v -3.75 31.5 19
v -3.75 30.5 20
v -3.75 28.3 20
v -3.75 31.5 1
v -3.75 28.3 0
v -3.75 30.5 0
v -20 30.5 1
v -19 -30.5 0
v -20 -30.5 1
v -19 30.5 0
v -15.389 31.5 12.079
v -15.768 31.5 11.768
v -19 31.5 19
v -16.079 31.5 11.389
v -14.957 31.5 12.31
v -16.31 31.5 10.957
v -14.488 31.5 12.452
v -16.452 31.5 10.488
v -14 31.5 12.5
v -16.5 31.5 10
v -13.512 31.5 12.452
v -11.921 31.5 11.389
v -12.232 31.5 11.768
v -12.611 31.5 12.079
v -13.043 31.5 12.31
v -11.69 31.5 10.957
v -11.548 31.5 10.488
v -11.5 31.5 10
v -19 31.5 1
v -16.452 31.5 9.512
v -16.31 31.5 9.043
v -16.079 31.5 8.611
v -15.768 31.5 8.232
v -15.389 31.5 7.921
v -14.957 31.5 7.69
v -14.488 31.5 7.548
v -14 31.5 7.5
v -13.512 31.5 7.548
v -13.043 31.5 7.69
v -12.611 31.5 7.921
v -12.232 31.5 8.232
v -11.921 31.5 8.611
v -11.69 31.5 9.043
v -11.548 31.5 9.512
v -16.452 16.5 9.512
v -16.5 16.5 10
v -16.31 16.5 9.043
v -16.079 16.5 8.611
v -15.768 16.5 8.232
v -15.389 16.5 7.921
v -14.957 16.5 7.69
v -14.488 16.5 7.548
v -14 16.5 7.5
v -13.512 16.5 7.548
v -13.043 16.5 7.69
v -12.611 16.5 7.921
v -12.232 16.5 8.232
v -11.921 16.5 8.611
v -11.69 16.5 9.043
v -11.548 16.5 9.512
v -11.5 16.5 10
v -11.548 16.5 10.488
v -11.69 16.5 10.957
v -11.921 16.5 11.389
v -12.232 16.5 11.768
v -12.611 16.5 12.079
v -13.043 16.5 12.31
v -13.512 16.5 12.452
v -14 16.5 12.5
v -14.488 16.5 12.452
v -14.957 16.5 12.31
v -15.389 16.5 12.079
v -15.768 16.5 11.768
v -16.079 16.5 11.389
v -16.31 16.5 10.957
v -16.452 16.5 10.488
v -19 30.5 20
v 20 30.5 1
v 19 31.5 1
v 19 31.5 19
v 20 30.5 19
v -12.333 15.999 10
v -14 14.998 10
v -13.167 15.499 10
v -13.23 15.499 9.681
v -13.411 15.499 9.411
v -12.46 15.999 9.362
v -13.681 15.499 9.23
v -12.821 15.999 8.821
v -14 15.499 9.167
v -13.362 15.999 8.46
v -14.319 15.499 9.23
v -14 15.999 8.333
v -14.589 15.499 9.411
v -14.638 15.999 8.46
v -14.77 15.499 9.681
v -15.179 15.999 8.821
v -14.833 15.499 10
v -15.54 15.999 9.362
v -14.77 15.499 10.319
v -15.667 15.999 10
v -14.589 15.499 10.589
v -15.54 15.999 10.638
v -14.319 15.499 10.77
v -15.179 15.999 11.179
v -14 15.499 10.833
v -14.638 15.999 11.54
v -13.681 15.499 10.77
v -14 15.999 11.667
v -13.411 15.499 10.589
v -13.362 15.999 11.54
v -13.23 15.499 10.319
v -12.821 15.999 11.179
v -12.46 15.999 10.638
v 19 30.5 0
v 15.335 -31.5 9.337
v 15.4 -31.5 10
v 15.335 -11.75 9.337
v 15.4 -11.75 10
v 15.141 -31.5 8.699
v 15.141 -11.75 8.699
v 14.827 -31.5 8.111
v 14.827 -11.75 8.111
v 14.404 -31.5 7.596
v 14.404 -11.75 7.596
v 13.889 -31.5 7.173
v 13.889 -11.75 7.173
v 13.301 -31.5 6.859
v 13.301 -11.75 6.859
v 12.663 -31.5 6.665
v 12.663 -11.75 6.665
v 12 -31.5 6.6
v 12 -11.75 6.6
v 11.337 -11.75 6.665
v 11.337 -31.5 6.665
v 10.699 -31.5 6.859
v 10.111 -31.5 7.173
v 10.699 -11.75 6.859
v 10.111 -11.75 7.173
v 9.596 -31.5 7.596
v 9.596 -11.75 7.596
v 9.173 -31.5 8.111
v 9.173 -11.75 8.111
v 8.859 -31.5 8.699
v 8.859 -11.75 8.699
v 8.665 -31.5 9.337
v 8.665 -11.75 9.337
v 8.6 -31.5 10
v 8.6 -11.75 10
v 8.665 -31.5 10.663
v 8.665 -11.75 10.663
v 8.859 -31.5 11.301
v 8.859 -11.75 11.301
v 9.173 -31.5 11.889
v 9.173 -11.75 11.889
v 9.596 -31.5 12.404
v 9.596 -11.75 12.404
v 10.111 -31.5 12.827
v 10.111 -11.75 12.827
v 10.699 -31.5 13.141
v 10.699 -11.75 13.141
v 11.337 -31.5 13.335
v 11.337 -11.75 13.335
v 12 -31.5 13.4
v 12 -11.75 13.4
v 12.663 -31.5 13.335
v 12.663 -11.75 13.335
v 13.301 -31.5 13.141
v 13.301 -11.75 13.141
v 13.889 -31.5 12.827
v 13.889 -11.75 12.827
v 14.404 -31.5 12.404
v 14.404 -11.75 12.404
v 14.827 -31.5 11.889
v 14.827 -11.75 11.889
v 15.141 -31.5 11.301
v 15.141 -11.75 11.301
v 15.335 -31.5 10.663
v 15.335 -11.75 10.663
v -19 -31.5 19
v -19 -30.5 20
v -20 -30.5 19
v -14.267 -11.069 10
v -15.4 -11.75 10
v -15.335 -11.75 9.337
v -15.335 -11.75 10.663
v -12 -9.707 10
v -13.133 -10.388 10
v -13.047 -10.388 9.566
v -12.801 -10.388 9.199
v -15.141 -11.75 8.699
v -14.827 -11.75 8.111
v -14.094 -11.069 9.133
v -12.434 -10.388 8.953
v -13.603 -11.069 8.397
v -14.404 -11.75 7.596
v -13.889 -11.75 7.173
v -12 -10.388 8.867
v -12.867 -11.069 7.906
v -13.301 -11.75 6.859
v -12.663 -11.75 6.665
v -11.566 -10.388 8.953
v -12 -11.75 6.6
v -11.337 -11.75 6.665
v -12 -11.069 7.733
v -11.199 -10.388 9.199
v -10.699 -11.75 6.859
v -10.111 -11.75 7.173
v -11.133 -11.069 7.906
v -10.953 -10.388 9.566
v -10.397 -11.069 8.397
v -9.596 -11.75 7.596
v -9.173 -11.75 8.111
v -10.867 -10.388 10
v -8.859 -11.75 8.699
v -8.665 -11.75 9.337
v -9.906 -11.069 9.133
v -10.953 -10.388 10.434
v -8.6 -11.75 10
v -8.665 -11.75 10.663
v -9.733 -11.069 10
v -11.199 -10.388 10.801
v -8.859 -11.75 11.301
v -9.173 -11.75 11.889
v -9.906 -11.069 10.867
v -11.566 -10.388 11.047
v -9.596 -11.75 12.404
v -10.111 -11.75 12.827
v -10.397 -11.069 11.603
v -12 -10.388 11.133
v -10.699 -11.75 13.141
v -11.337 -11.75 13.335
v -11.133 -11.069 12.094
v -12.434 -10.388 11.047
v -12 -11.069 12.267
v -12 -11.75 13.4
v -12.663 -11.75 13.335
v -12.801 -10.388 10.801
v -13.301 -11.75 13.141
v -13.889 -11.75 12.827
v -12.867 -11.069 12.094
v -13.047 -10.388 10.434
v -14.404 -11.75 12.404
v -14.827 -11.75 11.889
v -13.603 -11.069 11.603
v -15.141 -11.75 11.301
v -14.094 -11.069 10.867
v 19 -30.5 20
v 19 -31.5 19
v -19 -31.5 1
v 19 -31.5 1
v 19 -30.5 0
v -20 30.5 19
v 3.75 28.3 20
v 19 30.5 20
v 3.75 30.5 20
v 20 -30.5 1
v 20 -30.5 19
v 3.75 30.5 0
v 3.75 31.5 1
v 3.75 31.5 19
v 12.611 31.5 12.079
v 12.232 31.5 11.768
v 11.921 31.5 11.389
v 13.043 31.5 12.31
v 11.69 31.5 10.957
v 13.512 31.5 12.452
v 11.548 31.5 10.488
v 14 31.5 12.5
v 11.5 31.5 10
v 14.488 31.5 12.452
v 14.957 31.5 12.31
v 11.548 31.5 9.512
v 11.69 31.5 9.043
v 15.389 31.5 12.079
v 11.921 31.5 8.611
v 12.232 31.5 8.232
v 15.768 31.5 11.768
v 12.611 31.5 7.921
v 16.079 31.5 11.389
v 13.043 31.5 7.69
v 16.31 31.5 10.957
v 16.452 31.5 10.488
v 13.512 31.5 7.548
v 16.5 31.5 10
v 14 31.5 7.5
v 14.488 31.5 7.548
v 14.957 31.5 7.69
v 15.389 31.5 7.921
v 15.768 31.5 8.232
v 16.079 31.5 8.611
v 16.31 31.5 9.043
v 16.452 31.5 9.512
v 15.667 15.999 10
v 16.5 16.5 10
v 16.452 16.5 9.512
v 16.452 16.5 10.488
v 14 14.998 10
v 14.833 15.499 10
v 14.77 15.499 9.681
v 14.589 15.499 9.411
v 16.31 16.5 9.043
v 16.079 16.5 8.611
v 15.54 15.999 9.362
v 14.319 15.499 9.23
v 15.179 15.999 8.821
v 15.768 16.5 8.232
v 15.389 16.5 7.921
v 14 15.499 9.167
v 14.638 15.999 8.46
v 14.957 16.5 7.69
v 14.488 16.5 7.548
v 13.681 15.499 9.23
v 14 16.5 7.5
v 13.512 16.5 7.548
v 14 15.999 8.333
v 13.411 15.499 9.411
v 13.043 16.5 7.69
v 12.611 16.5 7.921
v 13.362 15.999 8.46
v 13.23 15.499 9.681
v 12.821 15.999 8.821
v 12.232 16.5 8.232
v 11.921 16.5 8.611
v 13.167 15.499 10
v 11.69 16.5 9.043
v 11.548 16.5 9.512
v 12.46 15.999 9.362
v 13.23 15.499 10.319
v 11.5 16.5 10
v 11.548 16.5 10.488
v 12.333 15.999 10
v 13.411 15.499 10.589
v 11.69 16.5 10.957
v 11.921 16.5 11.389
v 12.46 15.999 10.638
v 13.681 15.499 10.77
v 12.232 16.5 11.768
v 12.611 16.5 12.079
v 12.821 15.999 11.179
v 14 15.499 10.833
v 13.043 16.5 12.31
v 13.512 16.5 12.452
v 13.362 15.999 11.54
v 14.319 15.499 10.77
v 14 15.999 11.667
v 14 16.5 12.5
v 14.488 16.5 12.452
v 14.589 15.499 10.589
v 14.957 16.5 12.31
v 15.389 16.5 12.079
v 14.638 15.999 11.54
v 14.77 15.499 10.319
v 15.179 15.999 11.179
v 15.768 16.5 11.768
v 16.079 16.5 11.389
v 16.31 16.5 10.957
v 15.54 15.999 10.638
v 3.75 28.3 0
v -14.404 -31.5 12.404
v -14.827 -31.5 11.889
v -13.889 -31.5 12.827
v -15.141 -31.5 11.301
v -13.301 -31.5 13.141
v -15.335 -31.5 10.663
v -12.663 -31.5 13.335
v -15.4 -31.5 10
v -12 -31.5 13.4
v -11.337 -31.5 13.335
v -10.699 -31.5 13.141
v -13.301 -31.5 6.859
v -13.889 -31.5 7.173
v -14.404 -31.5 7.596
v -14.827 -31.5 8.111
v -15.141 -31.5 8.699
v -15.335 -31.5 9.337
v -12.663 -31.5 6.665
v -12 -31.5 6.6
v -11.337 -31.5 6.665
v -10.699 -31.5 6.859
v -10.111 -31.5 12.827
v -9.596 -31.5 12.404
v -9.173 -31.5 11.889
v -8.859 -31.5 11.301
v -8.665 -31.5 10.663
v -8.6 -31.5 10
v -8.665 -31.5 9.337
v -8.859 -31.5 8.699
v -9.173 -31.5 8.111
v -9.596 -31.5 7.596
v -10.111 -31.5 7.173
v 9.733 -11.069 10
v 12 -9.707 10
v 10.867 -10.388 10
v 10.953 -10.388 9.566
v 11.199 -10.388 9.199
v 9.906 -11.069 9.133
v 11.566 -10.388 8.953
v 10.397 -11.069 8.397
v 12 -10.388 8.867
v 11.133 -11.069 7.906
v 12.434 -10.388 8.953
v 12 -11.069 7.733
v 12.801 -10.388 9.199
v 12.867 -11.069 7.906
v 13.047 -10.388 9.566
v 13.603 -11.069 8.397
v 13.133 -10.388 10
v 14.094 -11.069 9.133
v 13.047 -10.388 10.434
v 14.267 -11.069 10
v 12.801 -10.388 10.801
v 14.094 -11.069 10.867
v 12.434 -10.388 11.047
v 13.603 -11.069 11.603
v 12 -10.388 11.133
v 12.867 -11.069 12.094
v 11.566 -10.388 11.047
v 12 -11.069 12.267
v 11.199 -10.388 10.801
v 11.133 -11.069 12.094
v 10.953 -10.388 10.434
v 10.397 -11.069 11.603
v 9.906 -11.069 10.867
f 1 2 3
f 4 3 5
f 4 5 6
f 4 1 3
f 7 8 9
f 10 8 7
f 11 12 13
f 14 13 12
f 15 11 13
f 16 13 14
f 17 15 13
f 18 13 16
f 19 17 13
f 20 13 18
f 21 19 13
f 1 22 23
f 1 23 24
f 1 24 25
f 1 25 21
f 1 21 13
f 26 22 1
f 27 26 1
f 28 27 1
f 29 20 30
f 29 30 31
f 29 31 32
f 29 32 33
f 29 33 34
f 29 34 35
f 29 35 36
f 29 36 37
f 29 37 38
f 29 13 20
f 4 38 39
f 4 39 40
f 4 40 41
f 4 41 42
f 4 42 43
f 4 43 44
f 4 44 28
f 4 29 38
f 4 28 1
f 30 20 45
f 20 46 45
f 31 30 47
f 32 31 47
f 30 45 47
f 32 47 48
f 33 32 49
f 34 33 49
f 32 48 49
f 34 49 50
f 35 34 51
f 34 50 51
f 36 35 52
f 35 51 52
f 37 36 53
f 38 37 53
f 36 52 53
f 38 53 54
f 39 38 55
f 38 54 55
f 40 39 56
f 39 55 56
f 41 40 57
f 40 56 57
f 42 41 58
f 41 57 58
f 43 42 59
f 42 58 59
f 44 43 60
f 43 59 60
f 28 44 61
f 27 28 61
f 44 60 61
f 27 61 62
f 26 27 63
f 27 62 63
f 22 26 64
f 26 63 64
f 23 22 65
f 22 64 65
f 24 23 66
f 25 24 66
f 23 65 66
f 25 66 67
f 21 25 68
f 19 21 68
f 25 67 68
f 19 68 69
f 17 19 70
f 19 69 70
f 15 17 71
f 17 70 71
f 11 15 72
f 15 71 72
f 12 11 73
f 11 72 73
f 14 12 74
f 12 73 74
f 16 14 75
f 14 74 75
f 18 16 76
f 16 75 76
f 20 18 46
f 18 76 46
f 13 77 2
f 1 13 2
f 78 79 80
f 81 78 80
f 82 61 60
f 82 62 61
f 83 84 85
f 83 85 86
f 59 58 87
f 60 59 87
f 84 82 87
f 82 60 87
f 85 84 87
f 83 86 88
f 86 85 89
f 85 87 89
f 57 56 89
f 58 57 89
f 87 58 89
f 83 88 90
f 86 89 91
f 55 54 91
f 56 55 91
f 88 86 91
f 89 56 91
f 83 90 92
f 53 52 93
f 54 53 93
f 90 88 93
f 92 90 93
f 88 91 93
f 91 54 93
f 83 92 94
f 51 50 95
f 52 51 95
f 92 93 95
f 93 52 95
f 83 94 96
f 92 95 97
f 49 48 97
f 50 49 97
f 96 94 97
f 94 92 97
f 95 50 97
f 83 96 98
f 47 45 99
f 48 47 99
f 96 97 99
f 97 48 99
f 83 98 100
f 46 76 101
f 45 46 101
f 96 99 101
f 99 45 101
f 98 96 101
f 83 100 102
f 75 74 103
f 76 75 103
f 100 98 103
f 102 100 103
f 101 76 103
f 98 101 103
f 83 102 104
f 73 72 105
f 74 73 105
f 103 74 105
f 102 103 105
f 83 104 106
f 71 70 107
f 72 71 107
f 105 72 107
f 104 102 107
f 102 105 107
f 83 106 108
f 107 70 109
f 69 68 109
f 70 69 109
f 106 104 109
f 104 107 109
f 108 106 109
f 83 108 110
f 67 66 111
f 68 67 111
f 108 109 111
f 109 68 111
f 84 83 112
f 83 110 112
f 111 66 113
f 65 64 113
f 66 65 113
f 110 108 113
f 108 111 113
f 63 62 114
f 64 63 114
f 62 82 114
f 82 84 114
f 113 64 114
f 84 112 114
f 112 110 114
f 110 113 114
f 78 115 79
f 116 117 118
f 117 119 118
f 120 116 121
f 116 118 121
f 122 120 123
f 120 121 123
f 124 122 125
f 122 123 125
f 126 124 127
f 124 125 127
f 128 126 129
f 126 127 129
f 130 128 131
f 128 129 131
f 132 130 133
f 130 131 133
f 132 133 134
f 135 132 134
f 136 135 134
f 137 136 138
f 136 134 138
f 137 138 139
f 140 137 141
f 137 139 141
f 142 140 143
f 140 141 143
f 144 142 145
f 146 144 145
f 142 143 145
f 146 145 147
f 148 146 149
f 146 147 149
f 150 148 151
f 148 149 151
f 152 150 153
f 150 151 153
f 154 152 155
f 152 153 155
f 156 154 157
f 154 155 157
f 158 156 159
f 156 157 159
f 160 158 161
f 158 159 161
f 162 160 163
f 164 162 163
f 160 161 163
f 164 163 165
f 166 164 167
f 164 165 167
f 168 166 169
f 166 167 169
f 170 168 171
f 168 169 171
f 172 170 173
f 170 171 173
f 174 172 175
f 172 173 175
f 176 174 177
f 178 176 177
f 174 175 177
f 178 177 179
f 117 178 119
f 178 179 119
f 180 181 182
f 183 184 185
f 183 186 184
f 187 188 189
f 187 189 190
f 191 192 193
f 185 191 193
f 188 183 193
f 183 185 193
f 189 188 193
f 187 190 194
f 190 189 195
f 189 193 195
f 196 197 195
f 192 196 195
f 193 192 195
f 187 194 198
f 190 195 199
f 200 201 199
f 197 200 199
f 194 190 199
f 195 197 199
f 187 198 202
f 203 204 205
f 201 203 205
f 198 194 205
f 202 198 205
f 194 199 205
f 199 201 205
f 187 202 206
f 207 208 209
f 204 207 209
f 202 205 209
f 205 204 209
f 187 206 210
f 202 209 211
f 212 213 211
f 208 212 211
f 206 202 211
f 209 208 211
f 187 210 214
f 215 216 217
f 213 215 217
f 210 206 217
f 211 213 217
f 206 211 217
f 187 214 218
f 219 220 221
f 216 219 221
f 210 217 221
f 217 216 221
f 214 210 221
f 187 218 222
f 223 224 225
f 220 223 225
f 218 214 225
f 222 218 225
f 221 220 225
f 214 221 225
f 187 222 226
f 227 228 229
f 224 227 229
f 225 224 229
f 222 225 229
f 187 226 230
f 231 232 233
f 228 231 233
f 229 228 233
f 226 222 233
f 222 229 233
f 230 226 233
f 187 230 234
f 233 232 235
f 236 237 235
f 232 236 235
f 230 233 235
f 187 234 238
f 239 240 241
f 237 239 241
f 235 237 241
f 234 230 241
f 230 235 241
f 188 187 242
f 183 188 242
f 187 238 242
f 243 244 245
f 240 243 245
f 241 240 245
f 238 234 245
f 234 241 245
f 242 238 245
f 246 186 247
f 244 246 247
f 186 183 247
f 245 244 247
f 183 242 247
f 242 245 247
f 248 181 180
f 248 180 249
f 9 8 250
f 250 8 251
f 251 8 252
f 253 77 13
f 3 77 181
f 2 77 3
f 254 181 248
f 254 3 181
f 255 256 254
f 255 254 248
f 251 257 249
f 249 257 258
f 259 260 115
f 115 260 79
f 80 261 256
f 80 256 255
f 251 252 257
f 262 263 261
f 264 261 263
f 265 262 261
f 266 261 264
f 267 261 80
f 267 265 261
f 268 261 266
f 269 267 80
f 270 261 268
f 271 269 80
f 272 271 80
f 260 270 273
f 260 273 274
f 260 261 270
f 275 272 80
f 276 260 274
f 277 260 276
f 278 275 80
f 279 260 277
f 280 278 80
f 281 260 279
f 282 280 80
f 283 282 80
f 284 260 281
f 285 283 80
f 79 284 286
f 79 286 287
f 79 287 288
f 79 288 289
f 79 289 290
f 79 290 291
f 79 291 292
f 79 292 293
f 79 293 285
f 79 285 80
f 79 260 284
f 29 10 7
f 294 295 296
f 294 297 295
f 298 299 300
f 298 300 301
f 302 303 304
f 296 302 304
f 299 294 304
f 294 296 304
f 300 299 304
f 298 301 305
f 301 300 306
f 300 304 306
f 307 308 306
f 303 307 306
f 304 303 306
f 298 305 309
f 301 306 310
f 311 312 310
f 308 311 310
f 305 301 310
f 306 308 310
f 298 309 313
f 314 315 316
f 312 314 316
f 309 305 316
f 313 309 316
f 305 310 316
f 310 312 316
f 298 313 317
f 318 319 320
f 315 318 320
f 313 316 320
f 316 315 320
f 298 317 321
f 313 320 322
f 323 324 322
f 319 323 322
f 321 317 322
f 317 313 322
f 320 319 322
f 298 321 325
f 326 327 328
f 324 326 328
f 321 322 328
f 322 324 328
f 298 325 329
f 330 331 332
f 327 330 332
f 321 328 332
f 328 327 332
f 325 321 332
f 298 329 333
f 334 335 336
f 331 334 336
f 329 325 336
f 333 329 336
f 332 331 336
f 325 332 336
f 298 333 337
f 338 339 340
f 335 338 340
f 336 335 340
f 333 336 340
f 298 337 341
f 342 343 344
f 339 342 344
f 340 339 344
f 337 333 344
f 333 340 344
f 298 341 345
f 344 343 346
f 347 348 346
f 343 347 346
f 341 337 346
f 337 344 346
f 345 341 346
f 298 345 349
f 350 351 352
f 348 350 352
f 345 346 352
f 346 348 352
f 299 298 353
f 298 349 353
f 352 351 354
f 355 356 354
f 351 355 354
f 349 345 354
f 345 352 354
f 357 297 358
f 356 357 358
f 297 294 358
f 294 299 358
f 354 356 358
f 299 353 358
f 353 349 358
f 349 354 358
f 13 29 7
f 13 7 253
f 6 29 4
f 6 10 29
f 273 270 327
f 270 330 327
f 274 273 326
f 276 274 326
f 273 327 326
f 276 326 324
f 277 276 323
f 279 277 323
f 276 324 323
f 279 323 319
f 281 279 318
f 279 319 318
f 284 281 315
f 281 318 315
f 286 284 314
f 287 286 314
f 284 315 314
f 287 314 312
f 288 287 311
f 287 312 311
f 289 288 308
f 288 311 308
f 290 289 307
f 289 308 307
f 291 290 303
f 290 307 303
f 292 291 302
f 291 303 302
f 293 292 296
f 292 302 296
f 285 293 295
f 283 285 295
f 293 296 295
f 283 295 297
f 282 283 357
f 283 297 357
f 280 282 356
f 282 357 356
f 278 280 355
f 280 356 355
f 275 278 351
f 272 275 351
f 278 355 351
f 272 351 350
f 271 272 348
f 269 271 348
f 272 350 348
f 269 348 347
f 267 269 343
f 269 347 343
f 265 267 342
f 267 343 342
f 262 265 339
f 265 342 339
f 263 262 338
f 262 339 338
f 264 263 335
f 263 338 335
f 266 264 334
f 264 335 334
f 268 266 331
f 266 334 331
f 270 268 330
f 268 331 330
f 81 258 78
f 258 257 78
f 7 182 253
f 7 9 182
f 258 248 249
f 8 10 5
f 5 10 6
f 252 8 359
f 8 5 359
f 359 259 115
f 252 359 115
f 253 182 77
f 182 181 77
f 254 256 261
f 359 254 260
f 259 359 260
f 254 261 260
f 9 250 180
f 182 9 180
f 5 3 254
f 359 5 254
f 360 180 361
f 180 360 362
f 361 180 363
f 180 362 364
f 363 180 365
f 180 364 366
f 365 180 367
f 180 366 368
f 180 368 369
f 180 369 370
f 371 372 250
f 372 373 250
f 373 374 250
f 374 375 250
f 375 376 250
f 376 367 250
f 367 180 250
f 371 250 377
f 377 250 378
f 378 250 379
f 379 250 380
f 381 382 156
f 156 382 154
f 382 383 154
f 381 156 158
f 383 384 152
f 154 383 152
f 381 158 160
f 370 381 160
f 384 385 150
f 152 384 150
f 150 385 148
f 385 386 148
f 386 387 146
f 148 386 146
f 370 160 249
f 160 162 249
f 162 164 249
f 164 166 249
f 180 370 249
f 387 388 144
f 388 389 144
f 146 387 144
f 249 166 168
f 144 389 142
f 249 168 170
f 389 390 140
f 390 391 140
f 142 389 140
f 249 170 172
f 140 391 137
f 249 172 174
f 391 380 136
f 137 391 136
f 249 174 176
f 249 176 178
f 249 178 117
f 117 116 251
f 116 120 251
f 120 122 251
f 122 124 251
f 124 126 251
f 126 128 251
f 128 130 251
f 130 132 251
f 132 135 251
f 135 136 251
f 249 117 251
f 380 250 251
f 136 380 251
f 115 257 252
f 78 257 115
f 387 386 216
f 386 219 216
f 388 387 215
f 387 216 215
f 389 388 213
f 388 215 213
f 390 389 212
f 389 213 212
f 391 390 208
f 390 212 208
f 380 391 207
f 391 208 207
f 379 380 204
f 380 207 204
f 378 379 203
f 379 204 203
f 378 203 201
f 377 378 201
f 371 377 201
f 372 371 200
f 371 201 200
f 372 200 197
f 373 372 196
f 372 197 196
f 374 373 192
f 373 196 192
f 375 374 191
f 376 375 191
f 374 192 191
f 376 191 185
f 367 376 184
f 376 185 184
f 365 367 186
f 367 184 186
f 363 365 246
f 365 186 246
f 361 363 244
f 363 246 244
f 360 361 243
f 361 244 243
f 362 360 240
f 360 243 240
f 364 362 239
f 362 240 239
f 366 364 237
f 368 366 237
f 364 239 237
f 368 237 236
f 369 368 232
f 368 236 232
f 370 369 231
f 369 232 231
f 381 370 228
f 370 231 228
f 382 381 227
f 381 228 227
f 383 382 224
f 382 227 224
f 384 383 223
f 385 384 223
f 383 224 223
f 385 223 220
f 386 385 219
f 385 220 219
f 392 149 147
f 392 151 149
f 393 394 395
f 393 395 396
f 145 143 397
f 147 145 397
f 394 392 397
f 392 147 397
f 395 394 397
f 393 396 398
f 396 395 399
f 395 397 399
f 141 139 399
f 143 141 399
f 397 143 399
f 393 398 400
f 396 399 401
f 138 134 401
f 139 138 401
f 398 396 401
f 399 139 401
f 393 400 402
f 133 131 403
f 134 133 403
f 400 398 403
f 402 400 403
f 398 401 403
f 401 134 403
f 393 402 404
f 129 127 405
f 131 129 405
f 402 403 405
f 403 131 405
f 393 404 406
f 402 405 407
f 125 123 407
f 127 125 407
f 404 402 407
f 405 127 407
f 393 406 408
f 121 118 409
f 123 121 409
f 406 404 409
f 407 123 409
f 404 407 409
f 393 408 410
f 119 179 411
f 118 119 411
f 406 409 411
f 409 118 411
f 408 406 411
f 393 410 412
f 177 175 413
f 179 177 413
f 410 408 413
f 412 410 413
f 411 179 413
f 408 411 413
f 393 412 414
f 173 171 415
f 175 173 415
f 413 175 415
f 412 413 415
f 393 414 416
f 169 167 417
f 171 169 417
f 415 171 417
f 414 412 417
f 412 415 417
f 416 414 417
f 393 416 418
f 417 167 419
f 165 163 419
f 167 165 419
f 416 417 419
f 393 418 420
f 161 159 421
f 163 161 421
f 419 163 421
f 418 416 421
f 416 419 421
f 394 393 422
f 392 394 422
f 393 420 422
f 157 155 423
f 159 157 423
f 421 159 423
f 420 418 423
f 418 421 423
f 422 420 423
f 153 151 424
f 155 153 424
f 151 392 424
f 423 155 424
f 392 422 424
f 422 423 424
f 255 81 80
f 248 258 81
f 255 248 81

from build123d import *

# Parameters (mm, degrees)
SKETCH1_W             = 40
SKETCH1_H             = 63
BOSS_EXTRUDE1_DEPTH   = 20
SKETCH2_W             = 7.5
SKETCH2_H             = 20
CUT_EXTRUDE1_DEPTH    = 3.2
M8_TAPPED_HOLE1_D     = 6.8
M8_TAPPED_HOLE1_DEPTH = 19.75
M8_TAPPED_HOLE1_TIP   = 2.042926105
M6_TAPPED_HOLE1_D     = 5
M6_TAPPED_HOLE1_DEPTH = 15
M6_TAPPED_HOLE1_TIP   = 1.502151548
CHAMFER1_SIZE         = 1


with BuildPart() as part:
    # Sketch1 → Boss-Extrude1 (new body)
    with BuildSketch(Plane.XY):
        Rectangle(SKETCH1_W, SKETCH1_H)
    extrude(amount=BOSS_EXTRUDE1_DEPTH)

    # Sketch2 → Cut-Extrude1 (cut)
    with BuildSketch(Plane(origin=(0, 31.5, 0), x_dir=(1, 0, 0), z_dir=(0, 1, 0))):
        with Locations((0, -10)):
            Rectangle(SKETCH2_W, SKETCH2_H)
    extrude(amount=-CUT_EXTRUDE1_DEPTH, mode=Mode.SUBTRACT)

    # M8 Tapped Hole1
    with Locations(Plane(origin=(0, -31.5, 0), x_dir=(-1, 0, 0), z_dir=(0, -1, 0))):
        with Locations((-12, -10), (12, -10)):
            Hole(M8_TAPPED_HOLE1_D / 2, depth=M8_TAPPED_HOLE1_DEPTH)
            with Locations((0, 0, -(M8_TAPPED_HOLE1_DEPTH + M8_TAPPED_HOLE1_TIP / 2))):  # 118° drill point
                Cone(0, M8_TAPPED_HOLE1_D / 2, M8_TAPPED_HOLE1_TIP, mode=Mode.SUBTRACT)

    # M6 Tapped Hole1
    with Locations(Plane(origin=(0, 31.5, 0), x_dir=(1, 0, 0), z_dir=(0, 1, 0))):
        with Locations((-14, -10), (14, -10)):
            Hole(M6_TAPPED_HOLE1_D / 2, depth=M6_TAPPED_HOLE1_DEPTH)
            with Locations((0, 0, -(M6_TAPPED_HOLE1_DEPTH + M6_TAPPED_HOLE1_TIP / 2))):  # 118° drill point
                Cone(0, M6_TAPPED_HOLE1_D / 2, M6_TAPPED_HOLE1_TIP, mode=Mode.SUBTRACT)

    # Chamfer1
    chamfer1_edges = [part.edges().sort_by_distance(p)[0] for p in [
        (-20, 0, 20),
        (-11.875, 31.5, 0),
        (0, -31.5, 20),
        (-11.875, 31.5, 20),
        (20, 0, 20),
        (0, -31.5, 0),
        (-20, 0, 0),
        (11.875, 31.5, 0),
        (20, 0, 0),
        (20, -31.5, 10),
        (-20, -31.5, 10),
        (-20, 31.5, 10),
        (20, 31.5, 10),
        (11.875, 31.5, 20),
    ]]
    chamfer(chamfer1_edges, length=CHAMFER1_SIZE)


solid = part.part
